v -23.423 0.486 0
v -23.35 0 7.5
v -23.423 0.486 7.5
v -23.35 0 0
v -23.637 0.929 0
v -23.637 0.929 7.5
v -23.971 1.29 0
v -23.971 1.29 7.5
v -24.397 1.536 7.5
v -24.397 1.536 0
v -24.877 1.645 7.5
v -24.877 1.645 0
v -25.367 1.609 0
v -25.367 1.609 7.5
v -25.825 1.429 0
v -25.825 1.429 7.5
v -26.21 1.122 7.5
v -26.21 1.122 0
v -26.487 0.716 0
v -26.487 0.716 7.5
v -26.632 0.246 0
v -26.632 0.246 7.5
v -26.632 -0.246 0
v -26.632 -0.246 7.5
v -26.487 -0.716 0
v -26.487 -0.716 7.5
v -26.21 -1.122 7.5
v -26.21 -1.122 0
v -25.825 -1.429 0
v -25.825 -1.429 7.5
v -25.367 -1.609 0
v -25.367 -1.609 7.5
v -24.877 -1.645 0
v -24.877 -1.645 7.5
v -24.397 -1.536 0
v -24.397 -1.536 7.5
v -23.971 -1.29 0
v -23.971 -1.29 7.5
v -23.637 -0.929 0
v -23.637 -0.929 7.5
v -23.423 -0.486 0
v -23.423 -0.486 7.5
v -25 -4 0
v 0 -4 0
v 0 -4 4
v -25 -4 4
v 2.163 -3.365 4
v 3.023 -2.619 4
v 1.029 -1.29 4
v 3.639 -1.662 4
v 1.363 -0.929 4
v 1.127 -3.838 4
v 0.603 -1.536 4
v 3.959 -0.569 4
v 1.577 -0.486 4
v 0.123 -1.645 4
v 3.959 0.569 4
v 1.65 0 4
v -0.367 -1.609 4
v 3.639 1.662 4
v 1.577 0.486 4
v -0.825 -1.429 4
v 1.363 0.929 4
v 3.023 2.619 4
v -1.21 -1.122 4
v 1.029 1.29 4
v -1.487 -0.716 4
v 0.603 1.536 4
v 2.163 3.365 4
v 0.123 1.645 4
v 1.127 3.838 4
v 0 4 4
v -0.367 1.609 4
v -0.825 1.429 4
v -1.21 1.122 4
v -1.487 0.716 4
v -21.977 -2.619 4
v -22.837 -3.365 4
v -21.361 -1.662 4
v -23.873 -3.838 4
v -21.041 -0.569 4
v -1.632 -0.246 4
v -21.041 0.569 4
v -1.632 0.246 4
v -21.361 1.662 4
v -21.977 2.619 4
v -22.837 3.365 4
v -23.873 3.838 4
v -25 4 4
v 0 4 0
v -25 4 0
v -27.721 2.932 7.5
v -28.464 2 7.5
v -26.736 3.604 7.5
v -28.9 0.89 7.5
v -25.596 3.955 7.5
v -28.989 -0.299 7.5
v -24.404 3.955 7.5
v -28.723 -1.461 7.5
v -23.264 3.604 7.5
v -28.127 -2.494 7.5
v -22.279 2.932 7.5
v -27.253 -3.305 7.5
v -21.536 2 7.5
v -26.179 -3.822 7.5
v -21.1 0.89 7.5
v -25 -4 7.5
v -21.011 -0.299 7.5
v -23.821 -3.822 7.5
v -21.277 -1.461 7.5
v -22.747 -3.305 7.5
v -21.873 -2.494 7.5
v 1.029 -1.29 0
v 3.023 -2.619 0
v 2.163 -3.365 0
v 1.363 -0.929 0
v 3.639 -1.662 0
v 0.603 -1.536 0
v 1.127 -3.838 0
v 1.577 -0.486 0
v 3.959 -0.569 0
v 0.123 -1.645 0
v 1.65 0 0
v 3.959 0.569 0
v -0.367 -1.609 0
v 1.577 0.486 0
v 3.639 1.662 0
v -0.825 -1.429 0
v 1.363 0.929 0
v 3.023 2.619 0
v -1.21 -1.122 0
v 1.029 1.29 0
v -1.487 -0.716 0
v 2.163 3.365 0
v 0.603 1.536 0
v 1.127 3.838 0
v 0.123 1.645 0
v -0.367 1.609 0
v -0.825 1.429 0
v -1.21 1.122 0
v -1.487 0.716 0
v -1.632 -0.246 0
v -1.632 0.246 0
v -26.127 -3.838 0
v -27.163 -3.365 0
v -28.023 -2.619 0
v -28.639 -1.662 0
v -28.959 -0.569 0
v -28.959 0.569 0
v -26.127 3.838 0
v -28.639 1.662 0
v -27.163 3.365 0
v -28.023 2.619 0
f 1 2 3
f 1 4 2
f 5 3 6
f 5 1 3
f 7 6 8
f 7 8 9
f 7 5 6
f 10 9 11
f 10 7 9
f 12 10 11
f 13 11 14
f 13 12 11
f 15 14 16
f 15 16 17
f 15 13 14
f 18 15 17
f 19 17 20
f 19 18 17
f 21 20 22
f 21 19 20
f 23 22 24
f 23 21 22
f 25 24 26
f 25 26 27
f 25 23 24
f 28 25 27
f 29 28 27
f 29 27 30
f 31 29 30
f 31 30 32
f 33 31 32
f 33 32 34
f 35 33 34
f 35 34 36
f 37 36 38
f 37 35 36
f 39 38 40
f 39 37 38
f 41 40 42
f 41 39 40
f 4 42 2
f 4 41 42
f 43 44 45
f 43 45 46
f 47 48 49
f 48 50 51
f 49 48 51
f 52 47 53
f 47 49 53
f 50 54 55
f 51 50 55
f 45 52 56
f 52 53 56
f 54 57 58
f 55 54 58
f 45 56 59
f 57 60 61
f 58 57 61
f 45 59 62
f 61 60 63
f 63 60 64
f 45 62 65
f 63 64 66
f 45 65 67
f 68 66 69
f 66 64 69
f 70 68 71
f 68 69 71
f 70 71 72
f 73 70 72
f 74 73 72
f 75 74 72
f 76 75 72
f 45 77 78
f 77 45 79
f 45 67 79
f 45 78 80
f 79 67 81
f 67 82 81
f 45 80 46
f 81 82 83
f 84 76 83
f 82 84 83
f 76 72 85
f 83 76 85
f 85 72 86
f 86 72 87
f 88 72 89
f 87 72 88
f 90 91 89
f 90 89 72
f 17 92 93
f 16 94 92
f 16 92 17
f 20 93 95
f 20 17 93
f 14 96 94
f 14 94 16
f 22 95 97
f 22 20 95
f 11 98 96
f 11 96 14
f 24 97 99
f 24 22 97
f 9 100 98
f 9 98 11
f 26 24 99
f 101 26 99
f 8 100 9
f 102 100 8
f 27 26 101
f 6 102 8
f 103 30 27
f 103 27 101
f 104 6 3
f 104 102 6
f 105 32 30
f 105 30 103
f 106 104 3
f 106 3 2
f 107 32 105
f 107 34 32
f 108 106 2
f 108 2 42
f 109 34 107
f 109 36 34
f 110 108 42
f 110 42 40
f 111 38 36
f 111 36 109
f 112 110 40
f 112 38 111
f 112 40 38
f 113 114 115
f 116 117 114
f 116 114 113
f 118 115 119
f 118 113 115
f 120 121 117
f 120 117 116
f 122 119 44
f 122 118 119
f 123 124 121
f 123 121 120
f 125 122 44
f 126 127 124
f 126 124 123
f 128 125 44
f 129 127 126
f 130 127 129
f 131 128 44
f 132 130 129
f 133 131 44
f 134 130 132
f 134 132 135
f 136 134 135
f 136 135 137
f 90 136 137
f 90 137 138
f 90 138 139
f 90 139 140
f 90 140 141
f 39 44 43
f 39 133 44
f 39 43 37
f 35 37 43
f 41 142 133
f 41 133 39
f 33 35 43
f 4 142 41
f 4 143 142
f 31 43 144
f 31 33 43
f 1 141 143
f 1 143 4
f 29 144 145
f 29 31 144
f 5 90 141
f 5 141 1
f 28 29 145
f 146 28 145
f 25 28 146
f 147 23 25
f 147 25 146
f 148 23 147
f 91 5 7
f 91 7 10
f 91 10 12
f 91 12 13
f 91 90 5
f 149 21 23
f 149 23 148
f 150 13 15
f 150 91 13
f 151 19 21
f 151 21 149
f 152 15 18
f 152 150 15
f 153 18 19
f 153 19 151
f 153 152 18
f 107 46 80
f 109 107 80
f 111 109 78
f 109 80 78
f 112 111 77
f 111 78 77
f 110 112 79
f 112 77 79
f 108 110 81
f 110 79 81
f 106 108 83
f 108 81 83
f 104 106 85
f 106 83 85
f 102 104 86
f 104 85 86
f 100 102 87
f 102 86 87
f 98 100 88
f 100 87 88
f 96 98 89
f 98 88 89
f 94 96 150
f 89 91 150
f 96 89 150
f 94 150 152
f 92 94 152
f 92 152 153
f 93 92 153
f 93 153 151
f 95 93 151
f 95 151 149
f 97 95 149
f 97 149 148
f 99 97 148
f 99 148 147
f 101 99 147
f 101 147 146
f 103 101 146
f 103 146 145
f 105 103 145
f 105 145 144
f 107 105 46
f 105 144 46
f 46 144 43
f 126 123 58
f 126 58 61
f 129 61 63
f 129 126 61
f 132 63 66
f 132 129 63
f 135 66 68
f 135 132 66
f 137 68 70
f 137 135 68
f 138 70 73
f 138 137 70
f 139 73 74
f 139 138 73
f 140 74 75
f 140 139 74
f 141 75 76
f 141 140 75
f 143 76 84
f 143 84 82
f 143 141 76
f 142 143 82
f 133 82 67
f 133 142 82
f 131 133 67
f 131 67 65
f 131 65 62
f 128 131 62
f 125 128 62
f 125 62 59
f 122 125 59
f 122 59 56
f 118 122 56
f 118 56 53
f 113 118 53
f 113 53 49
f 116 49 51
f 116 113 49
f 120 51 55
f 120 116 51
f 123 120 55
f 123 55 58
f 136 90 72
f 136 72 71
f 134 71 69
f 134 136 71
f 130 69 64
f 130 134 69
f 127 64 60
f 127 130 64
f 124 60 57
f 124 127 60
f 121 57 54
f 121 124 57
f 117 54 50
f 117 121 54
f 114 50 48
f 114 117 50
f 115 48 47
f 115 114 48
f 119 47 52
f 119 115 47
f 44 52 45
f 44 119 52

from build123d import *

# Parameters (mm, degrees)
SKETCH1_R           = 1.65
BOSS_EXTRUDE1_DEPTH = 4
SKETCH2_R           = 4
SKETCH2_R_2         = 1.65
BOSS_EXTRUDE2_DEPTH = 3.5


with BuildPart() as part:
    # Sketch1 → Boss-Extrude1 (new body)
    with BuildSketch(Plane.XY):
        with BuildLine():
            Line((-25, 4), (0, 4))
            ThreePointArc((0, 4), (4, 0), (0, -4))
            Line((0, -4), (-25, -4))
            ThreePointArc((-25, -4), (-29, 0), (-25, 4))
        make_face()
        Circle(SKETCH1_R, mode=Mode.SUBTRACT)
        with Locations((-25, 0)):
            Circle(SKETCH1_R, mode=Mode.SUBTRACT)
    extrude(amount=BOSS_EXTRUDE1_DEPTH)

    # Sketch2 → Boss-Extrude2 (add)
    with BuildSketch(Plane.XY.offset(4)):
        with Locations(Location((-25, 0, 0), (0, 0, 270))):
            Circle(SKETCH2_R)
        with Locations((-25, 0)):
            Circle(SKETCH2_R_2, mode=Mode.SUBTRACT)
    extrude(amount=BOSS_EXTRUDE2_DEPTH)


solid = part.part
